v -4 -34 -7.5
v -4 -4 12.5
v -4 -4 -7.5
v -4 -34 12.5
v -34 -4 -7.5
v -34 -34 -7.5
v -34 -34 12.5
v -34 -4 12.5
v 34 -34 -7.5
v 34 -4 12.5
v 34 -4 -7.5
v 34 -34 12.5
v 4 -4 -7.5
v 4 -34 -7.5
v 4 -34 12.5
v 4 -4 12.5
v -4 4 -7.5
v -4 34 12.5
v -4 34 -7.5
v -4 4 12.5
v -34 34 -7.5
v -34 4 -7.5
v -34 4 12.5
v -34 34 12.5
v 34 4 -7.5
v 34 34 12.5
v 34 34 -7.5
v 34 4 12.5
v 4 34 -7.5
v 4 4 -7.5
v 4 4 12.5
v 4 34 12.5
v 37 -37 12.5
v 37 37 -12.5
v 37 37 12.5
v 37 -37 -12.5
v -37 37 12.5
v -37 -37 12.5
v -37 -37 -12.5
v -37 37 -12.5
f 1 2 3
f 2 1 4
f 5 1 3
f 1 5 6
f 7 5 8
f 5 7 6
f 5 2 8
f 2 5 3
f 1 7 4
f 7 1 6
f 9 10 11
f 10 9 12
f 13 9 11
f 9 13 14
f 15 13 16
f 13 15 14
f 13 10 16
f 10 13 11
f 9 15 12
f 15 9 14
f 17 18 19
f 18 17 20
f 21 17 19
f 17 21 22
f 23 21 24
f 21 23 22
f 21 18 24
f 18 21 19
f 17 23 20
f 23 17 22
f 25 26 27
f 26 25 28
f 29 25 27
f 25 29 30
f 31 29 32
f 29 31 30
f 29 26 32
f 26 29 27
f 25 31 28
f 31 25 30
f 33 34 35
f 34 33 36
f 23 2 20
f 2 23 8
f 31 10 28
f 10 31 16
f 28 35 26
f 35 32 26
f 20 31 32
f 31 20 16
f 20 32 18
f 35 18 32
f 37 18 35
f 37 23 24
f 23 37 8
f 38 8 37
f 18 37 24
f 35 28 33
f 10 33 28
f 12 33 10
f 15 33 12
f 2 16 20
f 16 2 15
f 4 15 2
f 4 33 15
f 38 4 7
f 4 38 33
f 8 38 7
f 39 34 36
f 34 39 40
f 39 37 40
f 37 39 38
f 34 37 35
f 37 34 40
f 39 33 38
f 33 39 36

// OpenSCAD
$fn = 32;

// ----------------------------------------------------------------------
// Pocket plate 74 x 74 x 25
// 2 x 2 pockets 30 mm square, 20 mm deep
// ----------------------------------------------------------------------

// --- parameters (mm) ---
thickness = 25;  // plate thickness
floor_t = 5;     // material left under each pocket
pocket = 30;     // pocket side length
pitch_x = 38;    // pocket pitch along X
pitch_y = 38;    // pocket pitch along Y
cols = 2;        // pockets per row
rows = 2;        // rows of pockets

// --- derived feature positions (mm) ---
depth = thickness - floor_t;        // = 20   pocket depth, down to the floor
span_x = (cols - 1) * pitch_x;      // = 38   distance between outer pockets
span_y = (rows - 1) * pitch_y;      // = 38   distance between outer pocket rows
origin_x = -span_x / 2;             // = -19   X of the first pocket
origin_y = -span_y / 2;             // = -19   Y of the first pocket
plate = [span_x + pocket + 6, span_y + pocket + 6, thickness];  // = [74, 74, 25]   overall size: pockets plus 3 mm of wall on each side
feature_centers = [
  [origin_x + 0 * pitch_x, origin_y + 0 * pitch_y],
  [origin_x + 1 * pitch_x, origin_y + 0 * pitch_y],
  [origin_x + 0 * pitch_x, origin_y + 1 * pitch_y],
  [origin_x + 1 * pitch_x, origin_y + 1 * pitch_y]
];   // pocket centres, used verbatim by the cutter loop

// plate outline, then one pocket per centre in feature_centers
difference() {
  cube(plate, center = true);
  for (centre = feature_centers)
    translate([centre[0] - pocket / 2, centre[1] - pocket / 2, plate[2] / 2 - depth])
      cube([pocket, pocket, depth + 1]);  // centred on the declared pocket centre
}
